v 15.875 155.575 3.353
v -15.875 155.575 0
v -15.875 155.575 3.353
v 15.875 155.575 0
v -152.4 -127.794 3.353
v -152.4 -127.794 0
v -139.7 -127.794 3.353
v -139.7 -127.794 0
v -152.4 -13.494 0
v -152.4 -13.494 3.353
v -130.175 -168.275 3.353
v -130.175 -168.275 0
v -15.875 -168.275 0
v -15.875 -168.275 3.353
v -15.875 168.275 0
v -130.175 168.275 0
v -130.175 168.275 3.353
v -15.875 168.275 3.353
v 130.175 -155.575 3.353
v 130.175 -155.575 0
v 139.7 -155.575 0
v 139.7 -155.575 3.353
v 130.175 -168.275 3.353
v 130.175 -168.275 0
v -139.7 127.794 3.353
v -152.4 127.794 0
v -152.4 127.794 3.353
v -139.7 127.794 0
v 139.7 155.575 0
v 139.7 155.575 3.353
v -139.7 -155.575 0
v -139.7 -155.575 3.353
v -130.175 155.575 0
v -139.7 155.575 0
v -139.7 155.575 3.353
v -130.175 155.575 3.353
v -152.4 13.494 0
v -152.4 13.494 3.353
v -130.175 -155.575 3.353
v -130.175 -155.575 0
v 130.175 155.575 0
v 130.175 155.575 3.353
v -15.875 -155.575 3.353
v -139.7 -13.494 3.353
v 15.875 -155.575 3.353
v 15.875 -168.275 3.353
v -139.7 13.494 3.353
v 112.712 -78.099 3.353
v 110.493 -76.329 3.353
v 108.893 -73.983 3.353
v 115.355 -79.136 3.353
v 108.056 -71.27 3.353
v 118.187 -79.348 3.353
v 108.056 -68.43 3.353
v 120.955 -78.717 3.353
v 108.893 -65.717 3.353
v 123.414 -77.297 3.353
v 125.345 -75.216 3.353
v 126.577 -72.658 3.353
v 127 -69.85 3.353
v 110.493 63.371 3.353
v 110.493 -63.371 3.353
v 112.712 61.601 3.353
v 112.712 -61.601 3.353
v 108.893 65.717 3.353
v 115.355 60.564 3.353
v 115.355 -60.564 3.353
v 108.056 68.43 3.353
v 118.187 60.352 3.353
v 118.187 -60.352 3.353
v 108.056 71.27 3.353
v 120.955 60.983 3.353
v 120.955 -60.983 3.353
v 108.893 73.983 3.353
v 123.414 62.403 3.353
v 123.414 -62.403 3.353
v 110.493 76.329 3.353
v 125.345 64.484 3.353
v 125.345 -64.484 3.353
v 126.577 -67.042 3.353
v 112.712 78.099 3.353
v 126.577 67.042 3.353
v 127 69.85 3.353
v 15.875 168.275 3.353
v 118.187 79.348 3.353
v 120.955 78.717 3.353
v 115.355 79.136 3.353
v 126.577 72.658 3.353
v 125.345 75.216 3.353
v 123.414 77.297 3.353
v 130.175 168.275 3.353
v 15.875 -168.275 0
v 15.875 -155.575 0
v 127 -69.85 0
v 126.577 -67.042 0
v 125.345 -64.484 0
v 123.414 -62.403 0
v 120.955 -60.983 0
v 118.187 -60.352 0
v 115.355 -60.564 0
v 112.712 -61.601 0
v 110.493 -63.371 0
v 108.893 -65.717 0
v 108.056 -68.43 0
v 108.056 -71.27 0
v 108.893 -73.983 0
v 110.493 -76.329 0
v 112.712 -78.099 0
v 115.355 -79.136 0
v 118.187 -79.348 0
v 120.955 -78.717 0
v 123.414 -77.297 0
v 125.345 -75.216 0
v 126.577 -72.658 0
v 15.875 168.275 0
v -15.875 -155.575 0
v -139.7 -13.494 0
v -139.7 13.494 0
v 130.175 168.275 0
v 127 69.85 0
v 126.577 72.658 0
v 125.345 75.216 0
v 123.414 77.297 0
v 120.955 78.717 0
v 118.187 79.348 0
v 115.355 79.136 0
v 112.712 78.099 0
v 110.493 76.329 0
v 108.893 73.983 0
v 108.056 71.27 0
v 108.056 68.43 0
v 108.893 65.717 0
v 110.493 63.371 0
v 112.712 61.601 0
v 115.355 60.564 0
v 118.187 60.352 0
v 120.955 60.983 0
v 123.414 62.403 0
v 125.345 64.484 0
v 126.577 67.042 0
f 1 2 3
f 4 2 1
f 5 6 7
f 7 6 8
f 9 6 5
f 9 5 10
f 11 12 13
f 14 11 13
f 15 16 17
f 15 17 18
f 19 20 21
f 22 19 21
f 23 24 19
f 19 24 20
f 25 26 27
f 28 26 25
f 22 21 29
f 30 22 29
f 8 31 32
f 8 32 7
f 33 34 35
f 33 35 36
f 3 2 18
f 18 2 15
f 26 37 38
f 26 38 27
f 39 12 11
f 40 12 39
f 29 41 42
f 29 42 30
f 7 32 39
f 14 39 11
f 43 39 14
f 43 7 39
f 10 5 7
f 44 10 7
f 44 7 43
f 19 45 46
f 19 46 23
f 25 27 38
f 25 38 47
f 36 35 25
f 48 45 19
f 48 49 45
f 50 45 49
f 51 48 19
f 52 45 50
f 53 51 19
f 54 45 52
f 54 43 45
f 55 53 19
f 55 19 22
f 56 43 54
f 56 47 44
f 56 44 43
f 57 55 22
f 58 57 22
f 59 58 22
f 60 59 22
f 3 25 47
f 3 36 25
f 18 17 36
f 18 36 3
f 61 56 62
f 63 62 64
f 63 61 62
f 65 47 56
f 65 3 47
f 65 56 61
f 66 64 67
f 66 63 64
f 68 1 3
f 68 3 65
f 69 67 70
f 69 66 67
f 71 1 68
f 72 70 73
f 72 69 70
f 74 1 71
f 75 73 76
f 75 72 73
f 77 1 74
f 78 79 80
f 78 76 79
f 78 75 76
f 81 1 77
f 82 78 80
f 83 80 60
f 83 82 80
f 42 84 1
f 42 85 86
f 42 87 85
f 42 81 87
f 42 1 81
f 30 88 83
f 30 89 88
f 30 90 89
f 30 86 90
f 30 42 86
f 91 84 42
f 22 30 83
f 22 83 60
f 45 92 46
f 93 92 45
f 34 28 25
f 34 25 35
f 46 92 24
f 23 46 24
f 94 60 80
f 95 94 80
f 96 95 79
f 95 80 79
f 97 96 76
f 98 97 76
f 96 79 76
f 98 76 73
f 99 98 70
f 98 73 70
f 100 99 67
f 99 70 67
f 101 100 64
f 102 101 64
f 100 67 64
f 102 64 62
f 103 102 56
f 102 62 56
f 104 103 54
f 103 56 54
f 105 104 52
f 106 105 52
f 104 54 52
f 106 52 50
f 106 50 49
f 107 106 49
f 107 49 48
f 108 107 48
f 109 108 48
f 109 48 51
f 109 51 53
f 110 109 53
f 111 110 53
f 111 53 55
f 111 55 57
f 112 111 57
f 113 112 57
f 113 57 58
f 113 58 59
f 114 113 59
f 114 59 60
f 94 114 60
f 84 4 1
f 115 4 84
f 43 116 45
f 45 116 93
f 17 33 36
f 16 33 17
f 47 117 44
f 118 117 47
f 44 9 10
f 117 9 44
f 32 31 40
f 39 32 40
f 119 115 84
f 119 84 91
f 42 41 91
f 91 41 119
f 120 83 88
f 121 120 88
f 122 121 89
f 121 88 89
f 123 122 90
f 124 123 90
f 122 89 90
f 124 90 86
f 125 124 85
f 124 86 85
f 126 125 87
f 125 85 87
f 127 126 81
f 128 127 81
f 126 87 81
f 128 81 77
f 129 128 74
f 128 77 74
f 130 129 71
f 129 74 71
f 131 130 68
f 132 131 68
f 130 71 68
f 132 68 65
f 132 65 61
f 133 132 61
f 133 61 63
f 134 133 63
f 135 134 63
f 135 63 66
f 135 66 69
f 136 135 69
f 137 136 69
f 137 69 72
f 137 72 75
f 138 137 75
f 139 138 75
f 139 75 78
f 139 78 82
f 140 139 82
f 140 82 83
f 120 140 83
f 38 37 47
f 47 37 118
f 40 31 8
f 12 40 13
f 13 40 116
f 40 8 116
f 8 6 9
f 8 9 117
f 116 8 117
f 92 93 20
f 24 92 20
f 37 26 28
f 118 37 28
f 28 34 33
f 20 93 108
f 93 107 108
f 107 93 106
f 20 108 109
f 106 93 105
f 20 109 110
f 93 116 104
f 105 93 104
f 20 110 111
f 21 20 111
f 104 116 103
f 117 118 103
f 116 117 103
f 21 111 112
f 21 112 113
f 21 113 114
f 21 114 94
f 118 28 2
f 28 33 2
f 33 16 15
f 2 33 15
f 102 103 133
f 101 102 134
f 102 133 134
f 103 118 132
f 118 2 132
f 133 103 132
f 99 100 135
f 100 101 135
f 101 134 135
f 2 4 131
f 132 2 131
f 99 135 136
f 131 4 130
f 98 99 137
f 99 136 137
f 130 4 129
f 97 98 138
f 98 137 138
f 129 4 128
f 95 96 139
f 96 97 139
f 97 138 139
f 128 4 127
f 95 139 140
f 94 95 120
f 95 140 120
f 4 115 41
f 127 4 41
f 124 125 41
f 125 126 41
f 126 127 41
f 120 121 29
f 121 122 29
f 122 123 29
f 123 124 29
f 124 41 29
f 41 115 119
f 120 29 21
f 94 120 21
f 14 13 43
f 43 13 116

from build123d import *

# Parameters (mm, degrees)
SKETCH1_W           = 279.4
SKETCH1_H           = 311.15
SKETCH1_W_2         = 114.3
SKETCH1_H_2         = 12.7
SKETCH1_W_3         = 12.7
SKETCH1_H_3         = 114.3
BOSS_EXTRUDE1_DEPTH = 3.3528
SKETCH2_R           = 9.525
CUT_EXTRUDE1_DEPTH  = 6.7056


with BuildPart() as part:
    # Sketch1 → Boss-Extrude1 (new body)
    with BuildSketch(Plane.XY):
        Rectangle(SKETCH1_W, SKETCH1_H)
        with Locations((-73.025, -161.925)):
            Rectangle(SKETCH1_W_2, SKETCH1_H_2)
        with Locations((73.025, -161.925)):
            Rectangle(SKETCH1_W_2, SKETCH1_H_2)
        with Locations((-146.05, -70.64375)):
            Rectangle(SKETCH1_W_3, SKETCH1_H_3)
        with Locations((-146.05, 70.64375)):
            Rectangle(SKETCH1_W_3, SKETCH1_H_3)
        with Locations((73.025, 161.925)):
            Rectangle(SKETCH1_W_2, SKETCH1_H_2)
        with Locations((-73.025, 161.925)):
            Rectangle(SKETCH1_W_2, SKETCH1_H_2)
    extrude(amount=BOSS_EXTRUDE1_DEPTH)

    # Sketch2 → Cut-Extrude1 (cut)
    with BuildSketch(Plane.XY.offset(3.3528)):
        with Locations((117.475, 69.85)):
            Circle(SKETCH2_R)
        with Locations((117.475, -69.85)):
            Circle(SKETCH2_R)
    extrude(amount=-CUT_EXTRUDE1_DEPTH, mode=Mode.SUBTRACT)


solid = part.part
